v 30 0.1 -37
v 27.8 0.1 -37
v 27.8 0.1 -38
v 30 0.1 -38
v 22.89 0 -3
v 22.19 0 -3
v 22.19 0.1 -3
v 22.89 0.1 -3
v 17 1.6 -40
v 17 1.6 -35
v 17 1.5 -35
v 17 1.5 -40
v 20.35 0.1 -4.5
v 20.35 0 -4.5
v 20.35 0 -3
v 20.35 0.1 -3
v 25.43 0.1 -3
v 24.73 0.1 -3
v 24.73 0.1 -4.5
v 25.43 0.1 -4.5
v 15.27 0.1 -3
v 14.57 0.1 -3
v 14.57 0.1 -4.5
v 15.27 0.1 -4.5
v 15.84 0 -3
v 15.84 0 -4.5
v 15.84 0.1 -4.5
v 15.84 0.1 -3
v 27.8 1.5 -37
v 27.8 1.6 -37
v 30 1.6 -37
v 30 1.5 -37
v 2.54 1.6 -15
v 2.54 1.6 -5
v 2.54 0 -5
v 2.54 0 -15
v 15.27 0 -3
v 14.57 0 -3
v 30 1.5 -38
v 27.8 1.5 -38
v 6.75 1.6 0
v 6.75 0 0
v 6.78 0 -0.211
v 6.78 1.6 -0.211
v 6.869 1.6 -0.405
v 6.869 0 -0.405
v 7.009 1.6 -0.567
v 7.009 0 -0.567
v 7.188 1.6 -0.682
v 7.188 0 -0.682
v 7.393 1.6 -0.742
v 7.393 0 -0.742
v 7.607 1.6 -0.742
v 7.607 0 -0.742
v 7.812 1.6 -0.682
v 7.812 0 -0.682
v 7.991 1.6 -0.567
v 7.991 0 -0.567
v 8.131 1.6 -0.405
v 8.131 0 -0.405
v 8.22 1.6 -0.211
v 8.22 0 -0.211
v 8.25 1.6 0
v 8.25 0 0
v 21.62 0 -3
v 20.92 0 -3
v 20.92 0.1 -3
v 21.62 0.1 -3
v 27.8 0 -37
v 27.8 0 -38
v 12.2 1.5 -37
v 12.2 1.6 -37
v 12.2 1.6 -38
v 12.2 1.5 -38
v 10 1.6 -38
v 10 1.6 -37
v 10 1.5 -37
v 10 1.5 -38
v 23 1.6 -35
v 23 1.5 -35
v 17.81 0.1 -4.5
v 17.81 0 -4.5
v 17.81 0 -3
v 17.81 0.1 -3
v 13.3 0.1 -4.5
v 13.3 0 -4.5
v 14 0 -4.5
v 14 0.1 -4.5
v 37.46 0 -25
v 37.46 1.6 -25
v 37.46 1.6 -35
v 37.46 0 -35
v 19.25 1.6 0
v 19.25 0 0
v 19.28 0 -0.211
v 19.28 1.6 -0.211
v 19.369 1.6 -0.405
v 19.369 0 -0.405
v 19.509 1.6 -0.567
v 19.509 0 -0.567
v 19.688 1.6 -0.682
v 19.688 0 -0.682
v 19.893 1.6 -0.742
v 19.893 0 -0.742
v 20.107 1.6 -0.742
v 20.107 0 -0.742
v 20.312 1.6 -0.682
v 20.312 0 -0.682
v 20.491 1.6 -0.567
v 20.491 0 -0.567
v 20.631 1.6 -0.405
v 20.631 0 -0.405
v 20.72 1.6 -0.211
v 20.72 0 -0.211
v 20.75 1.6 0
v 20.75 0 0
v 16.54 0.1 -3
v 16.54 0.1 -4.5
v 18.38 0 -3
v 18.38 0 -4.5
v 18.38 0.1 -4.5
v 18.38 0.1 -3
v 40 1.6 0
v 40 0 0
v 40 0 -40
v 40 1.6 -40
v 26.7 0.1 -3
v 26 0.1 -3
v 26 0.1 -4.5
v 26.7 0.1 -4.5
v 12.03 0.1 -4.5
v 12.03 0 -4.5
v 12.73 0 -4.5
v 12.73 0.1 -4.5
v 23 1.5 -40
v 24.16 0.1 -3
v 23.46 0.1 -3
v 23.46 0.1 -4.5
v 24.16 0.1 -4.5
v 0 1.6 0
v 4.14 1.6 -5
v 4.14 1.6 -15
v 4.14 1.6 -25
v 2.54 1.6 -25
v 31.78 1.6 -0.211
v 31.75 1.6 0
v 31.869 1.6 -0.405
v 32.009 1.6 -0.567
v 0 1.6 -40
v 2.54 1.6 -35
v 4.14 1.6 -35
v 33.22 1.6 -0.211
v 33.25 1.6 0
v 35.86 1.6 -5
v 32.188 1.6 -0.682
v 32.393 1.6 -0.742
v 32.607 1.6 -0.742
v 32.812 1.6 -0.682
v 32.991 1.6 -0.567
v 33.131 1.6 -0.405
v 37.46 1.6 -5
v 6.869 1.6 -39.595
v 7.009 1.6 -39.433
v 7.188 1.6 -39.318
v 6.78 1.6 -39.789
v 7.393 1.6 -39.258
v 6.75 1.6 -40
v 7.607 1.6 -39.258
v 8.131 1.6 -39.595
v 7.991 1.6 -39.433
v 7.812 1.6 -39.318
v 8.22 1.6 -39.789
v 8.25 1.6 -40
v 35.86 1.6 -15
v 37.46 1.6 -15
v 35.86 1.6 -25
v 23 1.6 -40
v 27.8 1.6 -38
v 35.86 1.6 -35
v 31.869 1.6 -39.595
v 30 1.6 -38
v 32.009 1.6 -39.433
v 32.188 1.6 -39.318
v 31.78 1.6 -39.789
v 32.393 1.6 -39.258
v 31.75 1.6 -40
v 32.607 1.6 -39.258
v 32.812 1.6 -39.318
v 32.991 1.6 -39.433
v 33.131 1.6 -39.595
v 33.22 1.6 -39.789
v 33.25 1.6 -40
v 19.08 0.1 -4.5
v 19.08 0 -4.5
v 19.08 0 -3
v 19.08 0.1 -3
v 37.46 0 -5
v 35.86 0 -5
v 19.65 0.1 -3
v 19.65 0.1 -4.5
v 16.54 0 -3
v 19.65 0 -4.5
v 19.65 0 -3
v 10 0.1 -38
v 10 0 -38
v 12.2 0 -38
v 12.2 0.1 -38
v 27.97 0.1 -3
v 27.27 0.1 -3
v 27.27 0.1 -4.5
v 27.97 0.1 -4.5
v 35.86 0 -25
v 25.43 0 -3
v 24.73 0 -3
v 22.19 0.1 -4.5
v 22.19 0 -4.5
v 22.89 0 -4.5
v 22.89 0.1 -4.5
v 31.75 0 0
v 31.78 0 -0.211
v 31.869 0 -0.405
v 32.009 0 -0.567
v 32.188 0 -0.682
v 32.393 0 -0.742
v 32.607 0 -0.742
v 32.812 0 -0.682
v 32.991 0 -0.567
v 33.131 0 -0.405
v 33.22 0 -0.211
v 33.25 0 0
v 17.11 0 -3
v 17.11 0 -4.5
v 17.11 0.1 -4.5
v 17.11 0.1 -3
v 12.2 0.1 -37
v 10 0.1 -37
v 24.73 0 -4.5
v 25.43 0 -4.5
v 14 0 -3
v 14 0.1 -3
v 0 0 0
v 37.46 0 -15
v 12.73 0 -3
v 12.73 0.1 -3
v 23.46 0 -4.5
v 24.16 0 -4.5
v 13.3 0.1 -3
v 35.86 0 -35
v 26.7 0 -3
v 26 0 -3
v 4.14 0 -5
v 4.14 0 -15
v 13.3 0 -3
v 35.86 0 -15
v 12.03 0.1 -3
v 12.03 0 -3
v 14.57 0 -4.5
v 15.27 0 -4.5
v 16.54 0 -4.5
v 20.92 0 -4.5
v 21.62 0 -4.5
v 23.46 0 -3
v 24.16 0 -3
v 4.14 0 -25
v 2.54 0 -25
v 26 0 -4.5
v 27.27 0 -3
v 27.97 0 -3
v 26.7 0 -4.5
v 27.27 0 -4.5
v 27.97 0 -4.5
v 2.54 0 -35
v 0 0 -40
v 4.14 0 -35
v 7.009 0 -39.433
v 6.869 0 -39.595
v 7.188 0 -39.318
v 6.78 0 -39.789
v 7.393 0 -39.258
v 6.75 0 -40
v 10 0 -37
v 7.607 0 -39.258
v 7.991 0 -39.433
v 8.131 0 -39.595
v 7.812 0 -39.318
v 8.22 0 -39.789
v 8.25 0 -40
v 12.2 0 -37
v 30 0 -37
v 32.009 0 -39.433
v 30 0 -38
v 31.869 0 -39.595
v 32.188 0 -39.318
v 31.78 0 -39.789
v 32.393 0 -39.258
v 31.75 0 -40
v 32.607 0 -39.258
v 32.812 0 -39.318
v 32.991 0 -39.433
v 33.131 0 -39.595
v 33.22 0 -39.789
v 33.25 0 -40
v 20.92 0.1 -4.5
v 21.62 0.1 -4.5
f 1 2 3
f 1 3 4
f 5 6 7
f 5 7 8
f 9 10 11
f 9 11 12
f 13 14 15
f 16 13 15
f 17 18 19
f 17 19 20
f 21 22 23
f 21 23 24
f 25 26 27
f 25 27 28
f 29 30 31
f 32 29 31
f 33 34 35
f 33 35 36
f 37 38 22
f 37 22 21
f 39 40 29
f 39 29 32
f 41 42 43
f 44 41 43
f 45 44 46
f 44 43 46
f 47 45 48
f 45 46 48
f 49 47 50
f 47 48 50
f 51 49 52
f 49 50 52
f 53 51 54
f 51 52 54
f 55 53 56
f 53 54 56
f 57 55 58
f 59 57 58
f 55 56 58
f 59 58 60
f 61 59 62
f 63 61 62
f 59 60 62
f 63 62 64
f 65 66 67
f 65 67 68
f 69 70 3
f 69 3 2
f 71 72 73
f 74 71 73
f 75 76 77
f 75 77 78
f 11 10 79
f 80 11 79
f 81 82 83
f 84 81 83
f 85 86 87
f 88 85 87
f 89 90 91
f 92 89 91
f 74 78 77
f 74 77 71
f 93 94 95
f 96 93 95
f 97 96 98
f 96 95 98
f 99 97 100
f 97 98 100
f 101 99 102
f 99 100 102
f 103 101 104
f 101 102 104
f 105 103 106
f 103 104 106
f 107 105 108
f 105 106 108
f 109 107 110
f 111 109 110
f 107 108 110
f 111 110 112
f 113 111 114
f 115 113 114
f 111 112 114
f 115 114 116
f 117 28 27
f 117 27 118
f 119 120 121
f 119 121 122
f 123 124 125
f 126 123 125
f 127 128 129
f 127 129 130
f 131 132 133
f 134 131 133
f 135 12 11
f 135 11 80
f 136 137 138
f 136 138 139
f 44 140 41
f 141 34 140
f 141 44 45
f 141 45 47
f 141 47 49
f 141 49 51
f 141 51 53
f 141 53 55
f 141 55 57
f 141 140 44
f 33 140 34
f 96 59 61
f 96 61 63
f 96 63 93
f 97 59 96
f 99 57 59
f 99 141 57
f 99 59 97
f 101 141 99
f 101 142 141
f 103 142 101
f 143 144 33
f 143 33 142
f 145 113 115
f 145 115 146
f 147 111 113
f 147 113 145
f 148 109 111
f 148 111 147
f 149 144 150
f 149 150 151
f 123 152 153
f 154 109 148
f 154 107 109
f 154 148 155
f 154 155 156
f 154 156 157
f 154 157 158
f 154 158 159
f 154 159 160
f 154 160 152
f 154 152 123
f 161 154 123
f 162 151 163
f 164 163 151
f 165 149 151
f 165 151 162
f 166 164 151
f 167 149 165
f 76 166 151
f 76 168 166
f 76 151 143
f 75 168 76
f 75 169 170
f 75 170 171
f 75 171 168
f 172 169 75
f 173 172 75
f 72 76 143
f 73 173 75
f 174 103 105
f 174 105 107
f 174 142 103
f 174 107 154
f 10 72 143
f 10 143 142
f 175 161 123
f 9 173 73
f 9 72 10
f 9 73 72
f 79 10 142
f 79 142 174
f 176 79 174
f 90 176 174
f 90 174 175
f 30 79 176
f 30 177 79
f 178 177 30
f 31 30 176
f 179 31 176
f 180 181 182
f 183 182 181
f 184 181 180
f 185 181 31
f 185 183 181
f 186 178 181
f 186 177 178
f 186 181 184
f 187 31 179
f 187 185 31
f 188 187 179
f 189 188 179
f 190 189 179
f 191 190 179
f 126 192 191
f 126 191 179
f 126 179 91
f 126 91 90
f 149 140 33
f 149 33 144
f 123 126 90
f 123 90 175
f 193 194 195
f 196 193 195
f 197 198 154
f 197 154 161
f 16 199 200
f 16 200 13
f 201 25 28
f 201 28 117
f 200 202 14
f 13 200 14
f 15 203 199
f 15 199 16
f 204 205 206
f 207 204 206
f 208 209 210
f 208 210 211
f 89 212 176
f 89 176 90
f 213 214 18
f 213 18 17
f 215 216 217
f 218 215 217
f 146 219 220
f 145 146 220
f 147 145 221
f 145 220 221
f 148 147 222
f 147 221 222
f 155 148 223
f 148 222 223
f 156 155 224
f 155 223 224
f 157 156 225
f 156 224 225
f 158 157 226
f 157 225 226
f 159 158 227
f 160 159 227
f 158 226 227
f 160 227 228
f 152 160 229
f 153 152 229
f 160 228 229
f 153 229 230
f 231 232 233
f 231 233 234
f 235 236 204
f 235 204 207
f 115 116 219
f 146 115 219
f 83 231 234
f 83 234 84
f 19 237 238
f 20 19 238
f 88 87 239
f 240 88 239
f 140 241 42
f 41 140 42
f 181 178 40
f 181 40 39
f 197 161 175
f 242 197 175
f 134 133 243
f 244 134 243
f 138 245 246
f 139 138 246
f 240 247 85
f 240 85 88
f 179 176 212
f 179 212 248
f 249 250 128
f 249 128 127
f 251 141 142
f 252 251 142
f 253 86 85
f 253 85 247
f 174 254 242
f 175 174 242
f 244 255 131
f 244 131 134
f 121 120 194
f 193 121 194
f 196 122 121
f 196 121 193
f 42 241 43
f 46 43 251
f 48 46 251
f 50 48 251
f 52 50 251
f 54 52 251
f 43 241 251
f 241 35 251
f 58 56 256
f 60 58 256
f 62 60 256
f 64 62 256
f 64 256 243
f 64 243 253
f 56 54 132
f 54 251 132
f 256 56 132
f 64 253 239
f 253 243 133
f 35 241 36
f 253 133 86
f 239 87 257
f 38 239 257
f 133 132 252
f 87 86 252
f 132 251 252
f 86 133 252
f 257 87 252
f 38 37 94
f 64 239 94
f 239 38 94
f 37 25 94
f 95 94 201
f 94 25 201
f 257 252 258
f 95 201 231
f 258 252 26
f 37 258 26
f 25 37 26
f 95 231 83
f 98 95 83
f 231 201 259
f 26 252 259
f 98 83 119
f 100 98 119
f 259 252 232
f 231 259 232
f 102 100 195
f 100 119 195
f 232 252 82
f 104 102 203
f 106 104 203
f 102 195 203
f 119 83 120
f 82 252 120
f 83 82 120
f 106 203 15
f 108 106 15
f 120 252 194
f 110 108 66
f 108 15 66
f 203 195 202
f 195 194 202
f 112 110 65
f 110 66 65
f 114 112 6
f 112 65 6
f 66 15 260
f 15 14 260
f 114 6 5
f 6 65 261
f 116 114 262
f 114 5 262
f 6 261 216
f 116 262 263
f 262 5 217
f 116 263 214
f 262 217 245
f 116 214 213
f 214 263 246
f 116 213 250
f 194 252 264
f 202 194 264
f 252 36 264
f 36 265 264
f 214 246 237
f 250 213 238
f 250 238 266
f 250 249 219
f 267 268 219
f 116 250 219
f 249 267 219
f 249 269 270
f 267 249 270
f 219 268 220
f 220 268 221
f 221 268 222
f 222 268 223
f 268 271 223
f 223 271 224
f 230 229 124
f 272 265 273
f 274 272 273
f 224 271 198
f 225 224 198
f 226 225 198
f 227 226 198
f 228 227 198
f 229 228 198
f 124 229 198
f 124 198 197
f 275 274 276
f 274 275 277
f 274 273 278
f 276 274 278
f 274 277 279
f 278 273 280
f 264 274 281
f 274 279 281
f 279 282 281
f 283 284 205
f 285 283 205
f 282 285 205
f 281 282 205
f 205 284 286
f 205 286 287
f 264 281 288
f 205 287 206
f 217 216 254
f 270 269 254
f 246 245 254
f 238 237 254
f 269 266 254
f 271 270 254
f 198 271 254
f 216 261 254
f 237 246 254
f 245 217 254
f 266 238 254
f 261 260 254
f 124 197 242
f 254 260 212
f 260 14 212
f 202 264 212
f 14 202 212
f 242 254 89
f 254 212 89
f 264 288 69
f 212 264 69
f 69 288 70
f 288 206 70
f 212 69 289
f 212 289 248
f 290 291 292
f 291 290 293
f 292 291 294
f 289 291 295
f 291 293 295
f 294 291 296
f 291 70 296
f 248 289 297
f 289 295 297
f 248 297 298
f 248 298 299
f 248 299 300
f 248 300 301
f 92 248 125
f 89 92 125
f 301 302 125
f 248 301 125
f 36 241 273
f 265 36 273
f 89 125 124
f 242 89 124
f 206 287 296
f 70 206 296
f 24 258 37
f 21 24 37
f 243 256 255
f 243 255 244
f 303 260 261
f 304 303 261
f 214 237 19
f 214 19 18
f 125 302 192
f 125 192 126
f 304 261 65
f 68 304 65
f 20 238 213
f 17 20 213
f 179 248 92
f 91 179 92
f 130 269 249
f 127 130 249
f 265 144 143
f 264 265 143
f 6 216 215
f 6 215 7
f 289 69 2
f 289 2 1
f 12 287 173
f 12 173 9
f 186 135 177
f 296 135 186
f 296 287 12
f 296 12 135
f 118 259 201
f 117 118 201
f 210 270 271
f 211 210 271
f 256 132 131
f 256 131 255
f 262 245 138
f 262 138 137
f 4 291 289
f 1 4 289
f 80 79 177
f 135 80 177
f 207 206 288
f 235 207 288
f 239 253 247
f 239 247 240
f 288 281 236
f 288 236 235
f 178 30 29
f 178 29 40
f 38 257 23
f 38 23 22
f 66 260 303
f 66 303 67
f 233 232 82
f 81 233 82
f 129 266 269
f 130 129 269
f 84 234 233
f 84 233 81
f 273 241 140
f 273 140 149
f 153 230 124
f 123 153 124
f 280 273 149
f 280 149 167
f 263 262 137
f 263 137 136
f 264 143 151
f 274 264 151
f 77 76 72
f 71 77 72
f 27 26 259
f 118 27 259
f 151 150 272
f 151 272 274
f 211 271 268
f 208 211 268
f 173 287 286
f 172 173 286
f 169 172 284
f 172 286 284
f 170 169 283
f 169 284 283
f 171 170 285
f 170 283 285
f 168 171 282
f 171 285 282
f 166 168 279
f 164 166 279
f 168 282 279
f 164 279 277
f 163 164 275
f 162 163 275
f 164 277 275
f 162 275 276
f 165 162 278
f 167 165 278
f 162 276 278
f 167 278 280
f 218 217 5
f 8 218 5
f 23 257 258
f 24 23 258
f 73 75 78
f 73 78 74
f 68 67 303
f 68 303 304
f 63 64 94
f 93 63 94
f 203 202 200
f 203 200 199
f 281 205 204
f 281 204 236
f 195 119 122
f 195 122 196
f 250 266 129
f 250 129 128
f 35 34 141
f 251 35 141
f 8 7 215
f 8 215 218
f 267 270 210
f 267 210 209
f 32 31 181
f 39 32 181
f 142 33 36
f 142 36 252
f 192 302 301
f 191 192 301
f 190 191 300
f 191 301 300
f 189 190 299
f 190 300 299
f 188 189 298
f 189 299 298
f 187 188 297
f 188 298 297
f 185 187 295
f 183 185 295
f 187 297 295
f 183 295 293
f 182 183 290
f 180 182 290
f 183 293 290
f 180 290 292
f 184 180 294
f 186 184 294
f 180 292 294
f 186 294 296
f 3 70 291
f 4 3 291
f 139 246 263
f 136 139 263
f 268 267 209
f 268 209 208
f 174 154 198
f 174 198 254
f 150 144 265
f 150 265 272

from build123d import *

# Parameters (mm, degrees)
SKETCH_1_W              = 40
SKETCH_1_H              = 40
EXTRUDE_1_DEPTH         = 1.6
HOLE_WIZARD_1_5_1_5_1_D = 1.5
SKETCH_8_W              = 1.6
SKETCH_8_H              = 10
CUT_EXTRUDE_2_DEPTH     = 57.591165388
SKETCH_9_W              = 2.2
SKETCH_9_H              = 1
SKETCH_9_W_2            = 6
SKETCH_9_H_2            = 5
CUT_EXTRUDE_3_DEPTH     = 0.1
SKETCH_10_W             = 2.2
SKETCH_10_H             = 1
CUT_EXTRUDE_4_DEPTH     = 0.1
SKETCH_11_W             = 0.7
SKETCH_11_H             = 1.5
CUT_EXTRUDE_5_DEPTH     = 0.1


with BuildPart() as part:
    # 스케치1 → 보스-돌출1 (new body)
    with BuildSketch(Plane(origin=(0, 0, 0), x_dir=(1, 0, 0), z_dir=(0, 1, 0))):
        with Locations((20, 20)):
            Rectangle(SKETCH_1_W, SKETCH_1_H)
    extrude(amount=EXTRUDE_1_DEPTH)

    # Ø1.5 (1.5) 지름 구멍1 (through all)
    with Locations(Plane(origin=(0, 1.6, 0), x_dir=(1, 0, 0), z_dir=(0, 1, 0))):
        with Locations((7.5, 0), (7.5, 40), (20, 0), (32.5, 0), (32.5, 40)):
            Hole(HOLE_WIZARD_1_5_1_5_1_D / 2)

    # 스케치8 → 컷-돌출2 (cut, through all)
    with BuildSketch(Plane(origin=(0, 1.6, 0), x_dir=(1, 0, 0), z_dir=(0, 1, 0))):
        with Locations((3.34, 10)):
            Rectangle(SKETCH_8_W, SKETCH_8_H)
        with Locations((3.34, 30)):
            Rectangle(SKETCH_8_W, SKETCH_8_H)
        with Locations((36.66, 10)):
            Rectangle(SKETCH_8_W, SKETCH_8_H)
        with Locations((36.66, 30)):
            Rectangle(SKETCH_8_W, SKETCH_8_H)
    extrude(amount=-CUT_EXTRUDE_2_DEPTH, mode=Mode.SUBTRACT)

    # 스케치9 → 컷-돌출3 (cut)
    with BuildSketch(Plane(origin=(0, 1.6, 0), x_dir=(1, 0, 0), z_dir=(0, 1, 0))):
        with Locations((11.1, 37.5)):
            Rectangle(SKETCH_9_W, SKETCH_9_H)
        with Locations((28.9, 37.5)):
            Rectangle(SKETCH_9_W, SKETCH_9_H)
        with Locations((20, 37.5)):
            Rectangle(SKETCH_9_W_2, SKETCH_9_H_2)
    extrude(amount=-CUT_EXTRUDE_3_DEPTH, mode=Mode.SUBTRACT)

    # 스케치10 → 컷-돌출4 (cut)
    with BuildSketch(Plane.XZ):
        with Locations((11.1, -37.5)):
            Rectangle(SKETCH_10_W, SKETCH_10_H)
        with Locations((28.9, -37.5)):
            Rectangle(SKETCH_10_W, SKETCH_10_H)
    extrude(amount=-CUT_EXTRUDE_4_DEPTH, mode=Mode.SUBTRACT)

    # 스케치11 → 컷-돌출5 (cut)
    with BuildSketch(Plane.XZ):
        with Locations((12.38, -3.75)):
            Rectangle(SKETCH_11_W, SKETCH_11_H)
        with Locations((13.65, -3.75)):
            Rectangle(SKETCH_11_W, SKETCH_11_H)
        with Locations((14.92, -3.75)):
            Rectangle(SKETCH_11_W, SKETCH_11_H)
        with Locations((16.19, -3.75)):
            Rectangle(SKETCH_11_W, SKETCH_11_H)
        with Locations((17.46, -3.75)):
            Rectangle(SKETCH_11_W, SKETCH_11_H)
        with Locations((18.73, -3.75)):
            Rectangle(SKETCH_11_W, SKETCH_11_H)
        with Locations((20, -3.75)):
            Rectangle(SKETCH_11_W, SKETCH_11_H)
        with Locations((21.27, -3.75)):
            Rectangle(SKETCH_11_W, SKETCH_11_H)
        with Locations((22.54, -3.75)):
            Rectangle(SKETCH_11_W, SKETCH_11_H)
        with Locations((23.81, -3.75)):
            Rectangle(SKETCH_11_W, SKETCH_11_H)
        with Locations((25.08, -3.75)):
            Rectangle(SKETCH_11_W, SKETCH_11_H)
        with Locations((26.35, -3.75)):
            Rectangle(SKETCH_11_W, SKETCH_11_H)
        with Locations((27.62, -3.75)):
            Rectangle(SKETCH_11_W, SKETCH_11_H)
    extrude(amount=-CUT_EXTRUDE_5_DEPTH, mode=Mode.SUBTRACT)


solid = part.part
